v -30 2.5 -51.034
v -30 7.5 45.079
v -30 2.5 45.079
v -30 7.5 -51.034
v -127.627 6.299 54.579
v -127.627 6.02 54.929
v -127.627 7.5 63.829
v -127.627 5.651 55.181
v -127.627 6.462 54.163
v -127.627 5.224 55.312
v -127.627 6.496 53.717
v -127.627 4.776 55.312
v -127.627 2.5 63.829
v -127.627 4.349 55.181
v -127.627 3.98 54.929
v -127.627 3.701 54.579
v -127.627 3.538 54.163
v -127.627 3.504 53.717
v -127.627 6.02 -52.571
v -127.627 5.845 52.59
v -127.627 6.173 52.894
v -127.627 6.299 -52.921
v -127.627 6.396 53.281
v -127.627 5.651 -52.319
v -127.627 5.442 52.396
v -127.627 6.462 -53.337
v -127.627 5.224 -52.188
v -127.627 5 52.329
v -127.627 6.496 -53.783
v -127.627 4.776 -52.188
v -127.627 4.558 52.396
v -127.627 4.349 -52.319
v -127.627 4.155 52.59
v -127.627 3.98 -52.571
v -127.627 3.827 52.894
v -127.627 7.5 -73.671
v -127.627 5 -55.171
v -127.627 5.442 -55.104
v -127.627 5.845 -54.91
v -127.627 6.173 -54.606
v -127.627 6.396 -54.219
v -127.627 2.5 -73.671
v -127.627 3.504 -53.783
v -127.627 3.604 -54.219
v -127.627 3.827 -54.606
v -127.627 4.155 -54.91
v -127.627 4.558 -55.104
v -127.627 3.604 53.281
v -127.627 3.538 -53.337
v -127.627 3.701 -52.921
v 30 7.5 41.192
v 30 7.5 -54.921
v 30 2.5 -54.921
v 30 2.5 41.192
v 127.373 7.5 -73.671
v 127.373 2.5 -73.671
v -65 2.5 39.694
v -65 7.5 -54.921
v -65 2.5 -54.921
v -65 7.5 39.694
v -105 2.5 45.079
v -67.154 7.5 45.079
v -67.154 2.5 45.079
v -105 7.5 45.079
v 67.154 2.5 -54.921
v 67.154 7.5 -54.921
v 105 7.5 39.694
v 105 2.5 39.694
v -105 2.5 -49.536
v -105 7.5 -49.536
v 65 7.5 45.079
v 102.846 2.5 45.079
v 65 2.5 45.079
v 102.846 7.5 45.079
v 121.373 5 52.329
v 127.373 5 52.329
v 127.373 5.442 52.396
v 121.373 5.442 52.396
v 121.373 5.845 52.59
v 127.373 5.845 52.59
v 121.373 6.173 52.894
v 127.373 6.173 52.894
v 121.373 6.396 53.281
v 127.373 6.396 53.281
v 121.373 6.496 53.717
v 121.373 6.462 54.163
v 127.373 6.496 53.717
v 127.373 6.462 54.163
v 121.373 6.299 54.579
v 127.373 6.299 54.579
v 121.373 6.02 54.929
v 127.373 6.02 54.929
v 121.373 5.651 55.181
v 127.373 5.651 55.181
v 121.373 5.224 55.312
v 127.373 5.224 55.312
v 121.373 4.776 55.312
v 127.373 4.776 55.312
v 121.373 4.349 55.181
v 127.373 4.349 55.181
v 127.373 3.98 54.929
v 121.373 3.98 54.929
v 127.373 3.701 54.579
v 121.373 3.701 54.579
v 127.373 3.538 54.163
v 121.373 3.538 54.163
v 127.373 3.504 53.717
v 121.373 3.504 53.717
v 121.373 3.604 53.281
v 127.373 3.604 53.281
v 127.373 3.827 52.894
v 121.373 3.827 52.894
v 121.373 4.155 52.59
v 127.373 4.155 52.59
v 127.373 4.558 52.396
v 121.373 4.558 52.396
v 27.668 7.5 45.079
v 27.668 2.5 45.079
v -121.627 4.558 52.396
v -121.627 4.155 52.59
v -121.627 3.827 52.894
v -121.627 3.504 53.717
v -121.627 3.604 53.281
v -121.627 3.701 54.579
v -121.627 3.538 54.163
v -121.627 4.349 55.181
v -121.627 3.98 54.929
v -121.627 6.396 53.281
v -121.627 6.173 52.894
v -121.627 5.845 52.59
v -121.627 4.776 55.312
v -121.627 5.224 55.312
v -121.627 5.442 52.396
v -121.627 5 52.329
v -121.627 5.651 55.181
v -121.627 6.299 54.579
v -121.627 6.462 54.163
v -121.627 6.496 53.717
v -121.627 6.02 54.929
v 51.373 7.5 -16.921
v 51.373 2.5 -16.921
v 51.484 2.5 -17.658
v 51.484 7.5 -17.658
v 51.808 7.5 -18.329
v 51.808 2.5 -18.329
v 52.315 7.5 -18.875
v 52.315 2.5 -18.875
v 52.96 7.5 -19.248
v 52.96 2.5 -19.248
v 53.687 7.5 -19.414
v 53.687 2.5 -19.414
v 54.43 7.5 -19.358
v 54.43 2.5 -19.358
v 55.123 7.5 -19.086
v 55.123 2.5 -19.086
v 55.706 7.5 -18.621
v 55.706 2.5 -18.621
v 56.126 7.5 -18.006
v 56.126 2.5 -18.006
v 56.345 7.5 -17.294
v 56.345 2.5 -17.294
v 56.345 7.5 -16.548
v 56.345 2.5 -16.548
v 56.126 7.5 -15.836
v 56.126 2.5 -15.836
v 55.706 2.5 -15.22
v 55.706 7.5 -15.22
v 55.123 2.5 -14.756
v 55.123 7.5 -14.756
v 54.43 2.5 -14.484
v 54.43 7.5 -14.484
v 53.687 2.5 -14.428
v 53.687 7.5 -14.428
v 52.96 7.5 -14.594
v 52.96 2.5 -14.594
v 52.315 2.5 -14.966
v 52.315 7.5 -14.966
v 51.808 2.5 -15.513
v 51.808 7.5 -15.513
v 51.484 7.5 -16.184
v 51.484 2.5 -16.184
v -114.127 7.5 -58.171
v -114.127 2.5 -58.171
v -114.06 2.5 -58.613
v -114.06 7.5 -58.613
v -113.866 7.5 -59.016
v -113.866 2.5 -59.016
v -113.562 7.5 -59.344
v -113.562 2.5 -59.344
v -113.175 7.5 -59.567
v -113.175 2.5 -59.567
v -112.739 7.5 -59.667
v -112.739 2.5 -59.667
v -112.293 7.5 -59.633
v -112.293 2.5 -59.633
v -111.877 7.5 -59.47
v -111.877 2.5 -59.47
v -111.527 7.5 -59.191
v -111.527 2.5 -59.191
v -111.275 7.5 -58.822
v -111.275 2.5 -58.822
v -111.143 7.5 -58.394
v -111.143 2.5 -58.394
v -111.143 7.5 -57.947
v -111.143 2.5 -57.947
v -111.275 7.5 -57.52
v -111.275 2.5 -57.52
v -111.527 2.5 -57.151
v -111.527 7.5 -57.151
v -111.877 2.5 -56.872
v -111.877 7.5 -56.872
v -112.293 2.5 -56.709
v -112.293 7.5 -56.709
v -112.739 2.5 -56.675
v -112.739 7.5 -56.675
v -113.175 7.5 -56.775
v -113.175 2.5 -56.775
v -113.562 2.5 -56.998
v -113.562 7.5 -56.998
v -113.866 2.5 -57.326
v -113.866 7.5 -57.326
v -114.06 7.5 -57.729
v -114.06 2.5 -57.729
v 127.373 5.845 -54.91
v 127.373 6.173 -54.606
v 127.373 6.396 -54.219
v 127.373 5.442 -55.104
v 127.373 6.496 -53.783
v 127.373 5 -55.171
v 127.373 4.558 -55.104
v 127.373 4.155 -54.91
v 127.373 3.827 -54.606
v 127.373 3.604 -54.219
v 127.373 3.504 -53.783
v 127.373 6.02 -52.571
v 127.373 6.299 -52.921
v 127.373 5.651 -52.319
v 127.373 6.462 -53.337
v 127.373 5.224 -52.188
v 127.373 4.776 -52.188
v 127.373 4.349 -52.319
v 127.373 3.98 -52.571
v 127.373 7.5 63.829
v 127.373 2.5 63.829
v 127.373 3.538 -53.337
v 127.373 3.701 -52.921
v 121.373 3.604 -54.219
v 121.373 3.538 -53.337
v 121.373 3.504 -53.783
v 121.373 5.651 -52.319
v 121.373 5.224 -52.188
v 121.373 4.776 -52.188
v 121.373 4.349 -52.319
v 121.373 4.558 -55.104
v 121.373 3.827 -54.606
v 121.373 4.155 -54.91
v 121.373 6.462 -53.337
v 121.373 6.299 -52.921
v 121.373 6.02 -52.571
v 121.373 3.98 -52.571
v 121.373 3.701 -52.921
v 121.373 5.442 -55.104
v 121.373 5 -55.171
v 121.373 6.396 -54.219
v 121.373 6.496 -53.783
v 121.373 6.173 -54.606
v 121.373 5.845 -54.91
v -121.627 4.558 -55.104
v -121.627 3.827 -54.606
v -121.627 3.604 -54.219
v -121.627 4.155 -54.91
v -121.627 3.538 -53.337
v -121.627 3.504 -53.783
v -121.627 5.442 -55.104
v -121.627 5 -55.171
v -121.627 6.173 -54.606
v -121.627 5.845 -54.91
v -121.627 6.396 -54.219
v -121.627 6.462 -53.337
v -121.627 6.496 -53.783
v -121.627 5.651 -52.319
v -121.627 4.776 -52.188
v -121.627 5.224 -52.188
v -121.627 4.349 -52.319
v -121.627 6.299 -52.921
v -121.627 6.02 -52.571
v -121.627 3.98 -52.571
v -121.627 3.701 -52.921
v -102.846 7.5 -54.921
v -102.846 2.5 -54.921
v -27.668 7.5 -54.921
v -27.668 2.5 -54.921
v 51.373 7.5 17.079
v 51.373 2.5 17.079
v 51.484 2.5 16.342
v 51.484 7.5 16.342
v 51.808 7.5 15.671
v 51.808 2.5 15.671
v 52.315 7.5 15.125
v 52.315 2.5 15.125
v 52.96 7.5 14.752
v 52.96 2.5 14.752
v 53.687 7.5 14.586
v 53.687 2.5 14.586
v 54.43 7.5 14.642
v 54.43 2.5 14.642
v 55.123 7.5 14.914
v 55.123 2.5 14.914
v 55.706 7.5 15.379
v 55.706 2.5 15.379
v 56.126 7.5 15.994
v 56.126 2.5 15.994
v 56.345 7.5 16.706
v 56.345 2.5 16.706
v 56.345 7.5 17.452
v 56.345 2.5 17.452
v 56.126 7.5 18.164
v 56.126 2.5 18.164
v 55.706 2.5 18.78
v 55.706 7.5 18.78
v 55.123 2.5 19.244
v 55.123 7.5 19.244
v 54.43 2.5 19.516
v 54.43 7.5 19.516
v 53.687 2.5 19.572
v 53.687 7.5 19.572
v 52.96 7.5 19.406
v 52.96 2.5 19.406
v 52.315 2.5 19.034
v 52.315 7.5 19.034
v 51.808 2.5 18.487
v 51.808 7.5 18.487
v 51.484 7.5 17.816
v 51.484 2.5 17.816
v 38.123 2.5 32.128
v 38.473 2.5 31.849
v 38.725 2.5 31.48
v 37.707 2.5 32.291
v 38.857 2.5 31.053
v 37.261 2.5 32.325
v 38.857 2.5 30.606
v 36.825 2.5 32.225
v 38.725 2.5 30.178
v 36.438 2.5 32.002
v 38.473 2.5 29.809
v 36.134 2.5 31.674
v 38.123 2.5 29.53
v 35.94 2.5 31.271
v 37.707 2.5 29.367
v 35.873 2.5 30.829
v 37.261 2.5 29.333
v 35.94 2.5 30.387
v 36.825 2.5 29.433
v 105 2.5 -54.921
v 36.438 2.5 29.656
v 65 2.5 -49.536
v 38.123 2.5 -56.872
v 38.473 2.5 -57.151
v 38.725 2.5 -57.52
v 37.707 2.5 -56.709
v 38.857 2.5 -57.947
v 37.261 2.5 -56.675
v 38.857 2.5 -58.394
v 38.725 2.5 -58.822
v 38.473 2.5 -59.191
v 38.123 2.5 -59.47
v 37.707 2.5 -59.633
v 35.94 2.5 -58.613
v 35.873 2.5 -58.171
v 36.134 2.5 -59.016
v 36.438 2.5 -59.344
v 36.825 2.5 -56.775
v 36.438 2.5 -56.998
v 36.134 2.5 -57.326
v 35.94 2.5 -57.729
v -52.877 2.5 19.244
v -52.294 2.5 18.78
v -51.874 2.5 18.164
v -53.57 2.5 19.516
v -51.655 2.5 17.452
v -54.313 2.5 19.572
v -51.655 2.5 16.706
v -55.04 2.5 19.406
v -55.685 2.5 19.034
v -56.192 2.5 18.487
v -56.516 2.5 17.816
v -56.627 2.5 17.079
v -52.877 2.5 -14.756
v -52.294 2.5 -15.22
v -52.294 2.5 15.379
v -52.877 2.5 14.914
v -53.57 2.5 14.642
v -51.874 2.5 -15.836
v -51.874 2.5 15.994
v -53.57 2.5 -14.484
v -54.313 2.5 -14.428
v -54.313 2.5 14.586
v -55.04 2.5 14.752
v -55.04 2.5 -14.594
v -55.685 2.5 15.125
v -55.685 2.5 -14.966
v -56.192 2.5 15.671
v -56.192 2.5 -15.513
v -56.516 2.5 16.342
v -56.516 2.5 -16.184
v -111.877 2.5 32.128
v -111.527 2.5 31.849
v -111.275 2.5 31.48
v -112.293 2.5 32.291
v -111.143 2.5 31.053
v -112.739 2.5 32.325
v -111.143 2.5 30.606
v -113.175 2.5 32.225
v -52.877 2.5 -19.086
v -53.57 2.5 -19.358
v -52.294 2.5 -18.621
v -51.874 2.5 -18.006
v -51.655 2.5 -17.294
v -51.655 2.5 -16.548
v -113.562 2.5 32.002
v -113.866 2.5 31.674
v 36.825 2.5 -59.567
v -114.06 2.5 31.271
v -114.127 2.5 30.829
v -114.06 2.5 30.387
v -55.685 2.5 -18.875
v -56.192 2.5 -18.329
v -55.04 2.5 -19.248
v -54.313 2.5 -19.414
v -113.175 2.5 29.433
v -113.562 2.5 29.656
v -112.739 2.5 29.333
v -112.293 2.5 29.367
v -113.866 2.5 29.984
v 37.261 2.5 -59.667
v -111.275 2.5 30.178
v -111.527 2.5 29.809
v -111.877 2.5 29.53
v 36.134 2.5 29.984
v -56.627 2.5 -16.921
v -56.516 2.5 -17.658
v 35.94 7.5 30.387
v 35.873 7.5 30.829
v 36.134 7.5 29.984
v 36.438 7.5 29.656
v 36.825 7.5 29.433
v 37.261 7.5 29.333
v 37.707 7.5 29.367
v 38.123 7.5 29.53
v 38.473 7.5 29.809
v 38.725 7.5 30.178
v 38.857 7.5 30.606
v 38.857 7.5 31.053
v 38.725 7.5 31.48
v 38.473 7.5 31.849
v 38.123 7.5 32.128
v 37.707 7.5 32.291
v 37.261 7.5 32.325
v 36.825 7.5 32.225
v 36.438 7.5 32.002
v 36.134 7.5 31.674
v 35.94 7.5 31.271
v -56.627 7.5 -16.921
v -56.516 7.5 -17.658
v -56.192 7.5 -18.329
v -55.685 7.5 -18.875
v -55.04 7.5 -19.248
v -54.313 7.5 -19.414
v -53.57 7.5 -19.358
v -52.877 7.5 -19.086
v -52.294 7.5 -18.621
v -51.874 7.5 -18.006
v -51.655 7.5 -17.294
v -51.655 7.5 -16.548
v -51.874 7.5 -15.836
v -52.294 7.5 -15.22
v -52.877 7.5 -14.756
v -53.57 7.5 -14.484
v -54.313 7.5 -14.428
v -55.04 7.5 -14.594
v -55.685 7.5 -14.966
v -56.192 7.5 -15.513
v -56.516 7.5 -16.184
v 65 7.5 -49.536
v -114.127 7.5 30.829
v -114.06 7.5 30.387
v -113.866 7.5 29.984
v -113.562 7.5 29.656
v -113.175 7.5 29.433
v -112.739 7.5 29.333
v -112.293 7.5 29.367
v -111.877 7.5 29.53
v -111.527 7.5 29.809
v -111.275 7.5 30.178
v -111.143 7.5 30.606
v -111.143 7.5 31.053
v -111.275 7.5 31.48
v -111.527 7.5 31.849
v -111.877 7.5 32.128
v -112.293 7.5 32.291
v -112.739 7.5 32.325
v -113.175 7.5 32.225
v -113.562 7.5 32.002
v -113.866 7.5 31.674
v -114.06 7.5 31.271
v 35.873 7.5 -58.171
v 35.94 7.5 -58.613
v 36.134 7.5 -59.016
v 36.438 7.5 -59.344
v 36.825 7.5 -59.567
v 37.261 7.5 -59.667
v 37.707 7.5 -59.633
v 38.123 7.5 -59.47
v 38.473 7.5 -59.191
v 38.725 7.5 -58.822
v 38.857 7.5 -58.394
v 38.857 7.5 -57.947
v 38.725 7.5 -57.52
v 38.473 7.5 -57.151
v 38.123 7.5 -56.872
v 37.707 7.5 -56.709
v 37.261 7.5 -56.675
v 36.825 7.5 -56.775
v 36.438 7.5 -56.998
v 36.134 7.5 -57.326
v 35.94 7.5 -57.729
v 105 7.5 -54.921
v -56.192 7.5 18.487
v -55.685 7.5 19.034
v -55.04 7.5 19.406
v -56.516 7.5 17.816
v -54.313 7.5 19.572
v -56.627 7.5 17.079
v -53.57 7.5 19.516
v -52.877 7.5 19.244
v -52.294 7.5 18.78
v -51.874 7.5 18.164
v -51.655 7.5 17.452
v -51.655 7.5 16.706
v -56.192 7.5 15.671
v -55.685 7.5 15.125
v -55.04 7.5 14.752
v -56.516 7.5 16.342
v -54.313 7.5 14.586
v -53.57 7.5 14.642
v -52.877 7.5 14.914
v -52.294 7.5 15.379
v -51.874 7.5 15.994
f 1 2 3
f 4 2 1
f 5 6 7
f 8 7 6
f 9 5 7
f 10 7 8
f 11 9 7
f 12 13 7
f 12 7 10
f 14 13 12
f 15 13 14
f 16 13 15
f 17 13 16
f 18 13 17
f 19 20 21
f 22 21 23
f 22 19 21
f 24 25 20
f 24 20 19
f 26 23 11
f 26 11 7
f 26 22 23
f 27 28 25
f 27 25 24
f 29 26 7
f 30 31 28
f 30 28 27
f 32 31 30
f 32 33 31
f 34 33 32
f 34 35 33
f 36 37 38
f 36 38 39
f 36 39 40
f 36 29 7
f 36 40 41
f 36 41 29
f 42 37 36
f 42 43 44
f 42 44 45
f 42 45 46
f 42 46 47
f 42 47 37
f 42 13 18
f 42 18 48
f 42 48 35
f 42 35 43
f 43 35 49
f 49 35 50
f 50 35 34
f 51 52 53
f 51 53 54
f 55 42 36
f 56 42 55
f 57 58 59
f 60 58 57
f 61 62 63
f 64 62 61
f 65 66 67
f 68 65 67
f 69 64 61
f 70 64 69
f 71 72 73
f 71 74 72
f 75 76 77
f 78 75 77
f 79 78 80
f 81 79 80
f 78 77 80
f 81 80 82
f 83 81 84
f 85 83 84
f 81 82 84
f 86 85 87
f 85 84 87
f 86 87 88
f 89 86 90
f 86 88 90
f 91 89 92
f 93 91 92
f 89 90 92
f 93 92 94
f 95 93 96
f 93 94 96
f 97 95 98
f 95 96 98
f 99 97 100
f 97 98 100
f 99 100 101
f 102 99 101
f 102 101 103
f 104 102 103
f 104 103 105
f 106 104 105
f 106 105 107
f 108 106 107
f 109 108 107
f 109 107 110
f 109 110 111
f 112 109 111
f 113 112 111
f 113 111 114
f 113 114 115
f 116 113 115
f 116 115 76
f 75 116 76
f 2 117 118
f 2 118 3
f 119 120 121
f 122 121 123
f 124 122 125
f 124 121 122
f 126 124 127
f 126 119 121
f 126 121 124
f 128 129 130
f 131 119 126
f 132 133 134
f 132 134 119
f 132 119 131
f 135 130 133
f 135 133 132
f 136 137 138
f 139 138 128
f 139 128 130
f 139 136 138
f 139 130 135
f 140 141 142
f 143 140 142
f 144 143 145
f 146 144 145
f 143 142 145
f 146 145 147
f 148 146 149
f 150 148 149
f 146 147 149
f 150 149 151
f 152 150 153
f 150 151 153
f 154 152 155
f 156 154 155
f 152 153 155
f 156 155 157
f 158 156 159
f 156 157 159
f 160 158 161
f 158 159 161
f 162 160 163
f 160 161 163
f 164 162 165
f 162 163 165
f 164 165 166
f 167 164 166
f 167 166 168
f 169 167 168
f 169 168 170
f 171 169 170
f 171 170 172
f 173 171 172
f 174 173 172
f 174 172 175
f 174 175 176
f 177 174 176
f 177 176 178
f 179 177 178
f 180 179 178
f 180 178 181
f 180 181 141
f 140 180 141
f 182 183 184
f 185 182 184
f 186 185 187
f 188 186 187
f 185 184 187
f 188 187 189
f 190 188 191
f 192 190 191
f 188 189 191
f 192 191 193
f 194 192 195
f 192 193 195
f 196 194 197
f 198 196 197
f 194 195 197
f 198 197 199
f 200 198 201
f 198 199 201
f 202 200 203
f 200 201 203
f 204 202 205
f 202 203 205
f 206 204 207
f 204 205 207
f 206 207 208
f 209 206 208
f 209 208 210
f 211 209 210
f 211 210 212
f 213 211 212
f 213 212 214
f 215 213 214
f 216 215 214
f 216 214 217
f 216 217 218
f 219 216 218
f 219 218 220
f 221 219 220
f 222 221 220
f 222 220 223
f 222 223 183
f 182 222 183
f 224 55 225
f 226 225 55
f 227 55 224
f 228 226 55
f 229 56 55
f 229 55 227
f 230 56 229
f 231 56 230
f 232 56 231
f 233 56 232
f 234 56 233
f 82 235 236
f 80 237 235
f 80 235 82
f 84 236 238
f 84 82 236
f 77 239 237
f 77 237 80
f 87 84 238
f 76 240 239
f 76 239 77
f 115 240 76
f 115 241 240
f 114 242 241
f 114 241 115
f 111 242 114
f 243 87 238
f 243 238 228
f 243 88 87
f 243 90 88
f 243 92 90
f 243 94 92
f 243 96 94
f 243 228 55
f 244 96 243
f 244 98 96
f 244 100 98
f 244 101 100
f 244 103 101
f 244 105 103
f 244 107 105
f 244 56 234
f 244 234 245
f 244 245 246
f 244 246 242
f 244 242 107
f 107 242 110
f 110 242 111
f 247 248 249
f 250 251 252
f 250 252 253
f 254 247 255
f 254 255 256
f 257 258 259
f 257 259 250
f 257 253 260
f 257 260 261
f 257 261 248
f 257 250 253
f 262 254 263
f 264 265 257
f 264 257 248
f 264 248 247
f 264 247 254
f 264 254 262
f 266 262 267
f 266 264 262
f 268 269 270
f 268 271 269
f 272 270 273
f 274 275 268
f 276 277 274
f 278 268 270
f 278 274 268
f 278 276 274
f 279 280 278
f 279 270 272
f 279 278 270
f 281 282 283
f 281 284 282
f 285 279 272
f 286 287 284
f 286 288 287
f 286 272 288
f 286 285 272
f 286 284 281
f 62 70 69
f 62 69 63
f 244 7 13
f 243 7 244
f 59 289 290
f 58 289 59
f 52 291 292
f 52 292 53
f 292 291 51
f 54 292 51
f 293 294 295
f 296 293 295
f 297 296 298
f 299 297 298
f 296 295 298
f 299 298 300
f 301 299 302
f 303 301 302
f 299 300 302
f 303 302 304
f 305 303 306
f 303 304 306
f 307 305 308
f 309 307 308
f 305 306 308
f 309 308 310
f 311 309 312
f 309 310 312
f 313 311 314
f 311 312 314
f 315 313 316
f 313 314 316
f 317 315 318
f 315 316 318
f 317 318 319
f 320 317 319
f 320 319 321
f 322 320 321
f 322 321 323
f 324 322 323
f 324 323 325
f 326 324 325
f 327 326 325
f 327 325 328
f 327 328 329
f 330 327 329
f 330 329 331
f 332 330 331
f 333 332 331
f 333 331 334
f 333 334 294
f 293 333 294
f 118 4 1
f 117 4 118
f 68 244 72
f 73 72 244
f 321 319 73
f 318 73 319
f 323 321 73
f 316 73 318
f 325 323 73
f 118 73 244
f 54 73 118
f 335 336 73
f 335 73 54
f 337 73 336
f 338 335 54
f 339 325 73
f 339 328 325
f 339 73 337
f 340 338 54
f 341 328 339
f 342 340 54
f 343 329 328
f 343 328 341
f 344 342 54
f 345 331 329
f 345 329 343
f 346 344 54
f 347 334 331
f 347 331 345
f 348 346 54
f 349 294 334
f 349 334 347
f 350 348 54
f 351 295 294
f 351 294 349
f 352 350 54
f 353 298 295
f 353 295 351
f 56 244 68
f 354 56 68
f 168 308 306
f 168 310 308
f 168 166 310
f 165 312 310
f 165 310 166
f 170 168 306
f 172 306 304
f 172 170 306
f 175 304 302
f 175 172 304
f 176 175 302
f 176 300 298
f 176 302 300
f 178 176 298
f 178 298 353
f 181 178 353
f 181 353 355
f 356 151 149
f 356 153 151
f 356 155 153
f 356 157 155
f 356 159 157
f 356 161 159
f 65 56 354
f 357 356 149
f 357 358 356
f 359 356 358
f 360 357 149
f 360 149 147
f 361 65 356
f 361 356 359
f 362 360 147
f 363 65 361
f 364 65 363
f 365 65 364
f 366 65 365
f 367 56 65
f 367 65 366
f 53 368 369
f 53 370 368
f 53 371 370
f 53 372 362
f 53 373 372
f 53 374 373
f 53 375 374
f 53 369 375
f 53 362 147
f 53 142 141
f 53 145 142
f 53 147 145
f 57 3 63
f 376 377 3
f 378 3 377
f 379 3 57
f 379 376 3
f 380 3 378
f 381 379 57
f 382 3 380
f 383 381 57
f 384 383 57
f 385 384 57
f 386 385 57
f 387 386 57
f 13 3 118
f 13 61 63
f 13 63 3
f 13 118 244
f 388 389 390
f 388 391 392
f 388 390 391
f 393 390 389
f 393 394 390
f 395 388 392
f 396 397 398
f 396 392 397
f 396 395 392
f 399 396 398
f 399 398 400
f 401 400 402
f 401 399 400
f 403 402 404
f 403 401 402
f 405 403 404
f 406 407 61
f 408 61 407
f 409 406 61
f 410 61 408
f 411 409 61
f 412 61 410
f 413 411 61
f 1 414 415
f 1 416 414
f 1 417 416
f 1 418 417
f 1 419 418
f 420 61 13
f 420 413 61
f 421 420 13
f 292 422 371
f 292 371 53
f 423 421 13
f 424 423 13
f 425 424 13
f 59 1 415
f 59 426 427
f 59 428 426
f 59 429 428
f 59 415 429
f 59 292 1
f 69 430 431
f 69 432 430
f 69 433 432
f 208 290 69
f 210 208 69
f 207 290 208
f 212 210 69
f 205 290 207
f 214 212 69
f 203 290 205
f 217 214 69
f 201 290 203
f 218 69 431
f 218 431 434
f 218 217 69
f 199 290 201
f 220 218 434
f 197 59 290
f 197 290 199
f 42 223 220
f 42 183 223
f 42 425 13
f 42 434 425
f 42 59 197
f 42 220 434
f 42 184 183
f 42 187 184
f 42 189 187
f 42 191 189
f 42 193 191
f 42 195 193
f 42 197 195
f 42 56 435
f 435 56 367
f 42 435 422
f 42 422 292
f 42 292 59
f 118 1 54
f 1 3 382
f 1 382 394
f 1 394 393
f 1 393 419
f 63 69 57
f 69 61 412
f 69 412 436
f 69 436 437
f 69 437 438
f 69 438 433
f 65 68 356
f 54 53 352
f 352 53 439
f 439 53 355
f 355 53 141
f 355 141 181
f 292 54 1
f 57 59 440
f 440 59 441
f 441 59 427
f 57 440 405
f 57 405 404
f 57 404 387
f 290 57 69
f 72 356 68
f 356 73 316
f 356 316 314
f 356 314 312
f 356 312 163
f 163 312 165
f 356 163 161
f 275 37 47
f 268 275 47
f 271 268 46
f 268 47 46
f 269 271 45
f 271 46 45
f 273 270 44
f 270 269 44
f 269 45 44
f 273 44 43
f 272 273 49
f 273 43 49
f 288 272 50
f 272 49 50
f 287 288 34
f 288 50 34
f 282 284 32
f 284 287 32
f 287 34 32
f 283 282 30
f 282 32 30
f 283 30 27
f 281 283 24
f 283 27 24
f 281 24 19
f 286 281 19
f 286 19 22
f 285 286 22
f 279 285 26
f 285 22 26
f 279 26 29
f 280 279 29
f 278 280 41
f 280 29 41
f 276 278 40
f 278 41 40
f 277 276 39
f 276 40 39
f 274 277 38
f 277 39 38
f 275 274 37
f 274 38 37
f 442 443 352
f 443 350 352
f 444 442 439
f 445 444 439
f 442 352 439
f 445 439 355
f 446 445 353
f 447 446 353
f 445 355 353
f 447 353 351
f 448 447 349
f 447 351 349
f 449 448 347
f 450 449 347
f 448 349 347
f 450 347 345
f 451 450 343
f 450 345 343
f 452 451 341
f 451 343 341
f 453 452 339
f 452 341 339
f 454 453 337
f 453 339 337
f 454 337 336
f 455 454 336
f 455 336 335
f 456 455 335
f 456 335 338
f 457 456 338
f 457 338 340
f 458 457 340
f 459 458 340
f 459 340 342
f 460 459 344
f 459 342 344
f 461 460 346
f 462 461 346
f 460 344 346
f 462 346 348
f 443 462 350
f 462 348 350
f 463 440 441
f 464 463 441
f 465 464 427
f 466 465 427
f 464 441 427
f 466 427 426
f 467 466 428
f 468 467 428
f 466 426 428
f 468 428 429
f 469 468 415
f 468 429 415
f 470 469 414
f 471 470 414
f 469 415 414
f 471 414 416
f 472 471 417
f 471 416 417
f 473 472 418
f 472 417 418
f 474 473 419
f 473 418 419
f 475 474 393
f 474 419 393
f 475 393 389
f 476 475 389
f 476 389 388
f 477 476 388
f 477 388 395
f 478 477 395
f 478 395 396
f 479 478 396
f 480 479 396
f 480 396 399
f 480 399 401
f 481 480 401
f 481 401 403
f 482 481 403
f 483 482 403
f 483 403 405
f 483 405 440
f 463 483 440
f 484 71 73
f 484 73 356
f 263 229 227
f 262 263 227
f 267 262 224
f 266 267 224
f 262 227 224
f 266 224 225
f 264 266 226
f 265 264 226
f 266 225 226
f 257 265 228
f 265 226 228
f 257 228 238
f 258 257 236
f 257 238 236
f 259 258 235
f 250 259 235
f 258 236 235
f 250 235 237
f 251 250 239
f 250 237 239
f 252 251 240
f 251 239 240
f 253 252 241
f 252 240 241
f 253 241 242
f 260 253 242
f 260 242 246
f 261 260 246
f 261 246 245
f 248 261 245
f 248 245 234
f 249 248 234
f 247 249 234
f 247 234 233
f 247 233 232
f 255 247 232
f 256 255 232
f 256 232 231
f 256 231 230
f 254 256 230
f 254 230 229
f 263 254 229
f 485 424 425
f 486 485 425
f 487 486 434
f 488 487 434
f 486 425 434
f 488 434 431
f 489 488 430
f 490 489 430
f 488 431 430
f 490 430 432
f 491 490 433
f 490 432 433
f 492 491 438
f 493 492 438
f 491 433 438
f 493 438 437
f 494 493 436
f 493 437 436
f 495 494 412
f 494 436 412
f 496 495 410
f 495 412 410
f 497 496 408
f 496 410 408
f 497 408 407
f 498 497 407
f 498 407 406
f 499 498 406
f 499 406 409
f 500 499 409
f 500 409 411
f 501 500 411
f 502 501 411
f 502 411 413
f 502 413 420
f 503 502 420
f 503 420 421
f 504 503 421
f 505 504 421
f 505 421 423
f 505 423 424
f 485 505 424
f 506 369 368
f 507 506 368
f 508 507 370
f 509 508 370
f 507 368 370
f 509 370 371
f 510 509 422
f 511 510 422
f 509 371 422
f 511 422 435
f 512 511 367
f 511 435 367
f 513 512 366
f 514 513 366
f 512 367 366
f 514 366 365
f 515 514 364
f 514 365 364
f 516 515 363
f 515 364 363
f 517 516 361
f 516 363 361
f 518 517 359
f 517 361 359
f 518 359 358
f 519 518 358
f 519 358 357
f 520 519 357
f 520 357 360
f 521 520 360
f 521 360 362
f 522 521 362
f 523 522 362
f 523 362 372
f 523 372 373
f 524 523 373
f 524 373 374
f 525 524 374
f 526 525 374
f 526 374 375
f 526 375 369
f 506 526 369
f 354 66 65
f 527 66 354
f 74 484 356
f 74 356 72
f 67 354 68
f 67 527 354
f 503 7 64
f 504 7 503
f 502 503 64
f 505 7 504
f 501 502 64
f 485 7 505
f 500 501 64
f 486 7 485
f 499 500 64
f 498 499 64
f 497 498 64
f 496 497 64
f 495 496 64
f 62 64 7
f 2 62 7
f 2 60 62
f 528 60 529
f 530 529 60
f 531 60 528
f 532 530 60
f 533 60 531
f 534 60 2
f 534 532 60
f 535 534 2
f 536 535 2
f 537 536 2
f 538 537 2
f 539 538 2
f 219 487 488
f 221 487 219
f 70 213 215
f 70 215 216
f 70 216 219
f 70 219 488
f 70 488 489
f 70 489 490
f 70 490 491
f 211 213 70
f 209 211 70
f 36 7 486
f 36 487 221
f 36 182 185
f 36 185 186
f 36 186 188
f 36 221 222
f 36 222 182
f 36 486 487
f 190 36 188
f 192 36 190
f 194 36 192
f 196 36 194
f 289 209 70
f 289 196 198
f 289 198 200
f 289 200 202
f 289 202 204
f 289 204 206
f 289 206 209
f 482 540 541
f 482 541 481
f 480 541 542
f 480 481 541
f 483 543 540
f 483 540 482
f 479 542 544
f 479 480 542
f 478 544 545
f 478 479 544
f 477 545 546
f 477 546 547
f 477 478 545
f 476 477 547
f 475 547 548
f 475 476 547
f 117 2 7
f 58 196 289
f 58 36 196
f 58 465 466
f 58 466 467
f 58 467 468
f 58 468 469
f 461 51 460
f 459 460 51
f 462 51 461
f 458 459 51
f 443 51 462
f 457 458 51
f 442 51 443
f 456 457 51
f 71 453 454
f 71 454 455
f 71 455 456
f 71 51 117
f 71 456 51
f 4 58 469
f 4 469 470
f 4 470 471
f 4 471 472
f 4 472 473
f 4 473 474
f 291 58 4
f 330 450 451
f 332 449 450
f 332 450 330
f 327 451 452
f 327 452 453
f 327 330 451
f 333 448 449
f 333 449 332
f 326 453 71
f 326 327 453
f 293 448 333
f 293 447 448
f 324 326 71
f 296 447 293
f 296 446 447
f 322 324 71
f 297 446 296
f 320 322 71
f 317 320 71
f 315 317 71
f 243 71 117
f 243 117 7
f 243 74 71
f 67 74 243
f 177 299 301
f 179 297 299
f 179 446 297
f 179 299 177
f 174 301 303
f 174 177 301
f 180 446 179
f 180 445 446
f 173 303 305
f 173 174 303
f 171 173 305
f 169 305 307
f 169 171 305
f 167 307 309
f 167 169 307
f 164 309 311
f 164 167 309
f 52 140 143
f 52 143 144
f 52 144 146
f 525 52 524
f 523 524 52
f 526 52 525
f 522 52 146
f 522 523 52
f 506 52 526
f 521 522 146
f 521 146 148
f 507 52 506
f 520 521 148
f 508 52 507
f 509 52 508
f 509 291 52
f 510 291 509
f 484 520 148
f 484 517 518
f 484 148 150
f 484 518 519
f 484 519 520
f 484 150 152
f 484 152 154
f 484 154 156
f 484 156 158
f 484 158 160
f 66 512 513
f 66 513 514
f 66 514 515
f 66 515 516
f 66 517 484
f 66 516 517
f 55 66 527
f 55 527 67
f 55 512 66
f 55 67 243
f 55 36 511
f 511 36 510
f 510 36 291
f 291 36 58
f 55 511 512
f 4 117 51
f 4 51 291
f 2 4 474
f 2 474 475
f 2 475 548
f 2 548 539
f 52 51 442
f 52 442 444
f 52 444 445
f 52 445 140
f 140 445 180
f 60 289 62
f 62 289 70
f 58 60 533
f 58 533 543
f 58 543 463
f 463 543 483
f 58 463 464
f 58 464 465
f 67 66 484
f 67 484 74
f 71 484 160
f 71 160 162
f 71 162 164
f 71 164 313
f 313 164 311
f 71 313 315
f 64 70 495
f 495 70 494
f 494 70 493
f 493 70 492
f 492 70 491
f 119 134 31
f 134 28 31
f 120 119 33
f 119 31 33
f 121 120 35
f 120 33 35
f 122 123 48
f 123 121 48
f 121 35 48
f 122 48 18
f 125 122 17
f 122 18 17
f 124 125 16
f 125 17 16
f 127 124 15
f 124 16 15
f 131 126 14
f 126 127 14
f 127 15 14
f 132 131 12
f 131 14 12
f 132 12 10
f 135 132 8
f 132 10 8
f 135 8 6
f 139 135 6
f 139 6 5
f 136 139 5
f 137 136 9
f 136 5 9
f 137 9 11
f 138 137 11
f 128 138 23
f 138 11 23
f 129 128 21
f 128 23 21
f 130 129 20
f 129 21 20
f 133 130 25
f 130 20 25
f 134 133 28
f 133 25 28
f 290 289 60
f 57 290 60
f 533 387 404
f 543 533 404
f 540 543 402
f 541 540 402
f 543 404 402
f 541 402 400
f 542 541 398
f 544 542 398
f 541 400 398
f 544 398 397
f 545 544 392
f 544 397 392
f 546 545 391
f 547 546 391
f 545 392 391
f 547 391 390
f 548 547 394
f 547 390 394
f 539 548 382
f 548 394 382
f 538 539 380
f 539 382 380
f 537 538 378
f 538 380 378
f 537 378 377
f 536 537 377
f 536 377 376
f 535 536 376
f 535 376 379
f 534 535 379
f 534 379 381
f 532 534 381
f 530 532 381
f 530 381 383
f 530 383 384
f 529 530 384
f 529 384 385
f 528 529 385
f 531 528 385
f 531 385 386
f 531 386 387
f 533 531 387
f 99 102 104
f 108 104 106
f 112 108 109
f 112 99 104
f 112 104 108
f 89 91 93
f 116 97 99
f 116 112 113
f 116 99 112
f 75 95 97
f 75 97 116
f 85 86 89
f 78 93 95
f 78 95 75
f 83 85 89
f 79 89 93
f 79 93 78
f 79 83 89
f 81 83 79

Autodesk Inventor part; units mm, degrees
ref_plane "YZ Plane" through (0, 0, 0) normal (1, 0, 0) x (0, 1, 0)
ref_plane "XZ Plane" through (0, 0, 0) normal (0, 1, 0) x (-1, 0, 0)
ref_plane "XY Plane" through (0, 0, 0) normal (0, 0, 1) x (1, 0, 0)
sketch "Sketch1" plane through (0, 0, 0) normal (0, 1, 0) x (-1, 0, 0)
  circle A0 centre (-37.3734, -58.1709) radius 1.5
  circle A1 centre (112.6266, 30.8291) radius 1.5
  circle A2 centre (-37.3734, 30.8291) radius 1.5
  circle A3 centre (112.6266, -58.1709) radius 1.5
  circle A4 centre (54.1266, -16.9209) radius 2.5
  circle A5 centre (-53.8734, 17.0791) radius 2.5
  circle A6 centre (54.1266, 17.0791) radius 2.5
  circle A7 centre (-53.8734, -16.9209) radius 2.5
  line L0 (-127.3734, 73.8291) -> (127.6266, 73.8291)
  line L1 (-127.3734, -73.6709) -> (-127.3734, 73.8291)
  line L2 (127.6266, -73.6709) -> (-127.3734, -73.6709)
  line L3 (127.6266, 73.8291) -> (127.6266, -73.6709)
  point P0 (0, 0)
  point P1 (0.1266, 73.8291)
extrude "Extrusion1" add sketch "Sketch1" along normal blind 10
sketch "Sketch2" plane through (127.3734, 0, 73.8291) normal (1, 0, 0) x (0, 0, -1)
  line L0 (147.5, 0) -> (147.5, 10) projected
  line L1 (0, 0) -> (0, 10) projected
  circle A0 centre (127.5, 5) radius 1.5
  circle A1 centre (20, 5) radius 1.5
  point P0 (73.8291, 0)
  point P1 (0, 5)
  dimension "d2" = 20
  dimension "d3" = 20
  dimension "d4" = 3
  dimension "d5" = 3
extrude "Extrusion2" cut sketch "Sketch2" against normal blind 6
ref_plane "Work Plane1" through (-0.1266, 0, 73.8291) normal (1, 0, 0) x (0, 0, -1)
mirror "Mirror1" about plane through (-0.1266, 0, 73.8291) normal (1, 0, 0) of "Extrusion2"
sketch "Sketch3" plane through (-127.6266, 0, 73.8291) normal (0, 0, 1) x (1, 0, 0)
  line L0 (255, 10) -> (0, 10) projected
  line L1 (255, 0) -> (0, 0)
  line L2 (0, 0) -> (0, 10)
  line L3 (0, 10) -> (255, 10)
  line L4 (255, 10) -> (255, 0)
  point P0 (127.6266, 0)
extrude "Extrusion3" cut sketch "Sketch3" against normal blind 10
sketch "Sketch4" plane through (0, 10, 0) normal (0, 1, 0) x (1, 0, 0)
  line L0 (127.3734, -63.8291) -> (127.3734, 73.6709) projected
  line L1 (-127.6266, -63.8291) -> (127.3734, -63.8291)
  line L2 (127.3734, -63.8291) -> (127.3734, 73.6709)
  line L3 (127.3734, 73.6709) -> (-127.6266, 73.6709)
  line L4 (-127.6266, 73.6709) -> (-127.6266, -63.8291)
  point P0 (0, 0)
ref_plane "Work Plane2" through (0, 5, 0) normal (0, 1, 0) x (1, 0, 0)
extrude "Extrusion4" cut sketch "Sketch4" against normal blind 2.5
mirror "Mirror2" about plane through (0, 5, 0) normal (0, 1, 0) of "Extrusion4"
sketch "Sketch6" plane through (0, 7.5, 0) normal (0, 1, 0) x (1, 0, 0)
  circle A0 centre (37.3734, 58.1709) radius 1.5 projected
  circle A1 centre (-112.6266, -30.8291) radius 1.5 projected
  circle A2 centre (37.3734, -30.8291) radius 1.5 projected
  circle A3 centre (-112.6266, 58.1709) radius 1.5 projected
  circle A4 centre (-54.1266, 16.9209) radius 2.5 projected
  circle A5 centre (53.8734, -17.0791) radius 2.5 projected
  circle A6 centre (-54.1266, -17.0791) radius 2.5 projected
  circle A7 centre (53.8734, 16.9209) radius 2.5 projected
  line L0 (127.3734, 73.6709) -> (127.3734, -63.8291) projected
  line L1 (-127.6266, 73.6709) -> (127.3734, 73.6709) projected
  line L2 (-127.6266, -63.8291) -> (-127.6266, 73.6709) projected
  line L3 (127.3734, -63.8291) -> (-127.6266, -63.8291) projected
  line L4 (-30, 54.9209) -> (30, 54.9209)
  line L5 (30, 54.9209) -> (30, -45.0791)
  line L6 (30, -45.0791) -> (-30, -45.0791)
  line L7 (-30, -45.0791) -> (-30, 54.9209)
  line L8 (-105, 54.9209) -> (-65, 54.9209)
  line L9 (-65, 54.9209) -> (-65, -45.0791)
  line L10 (-65, -45.0791) -> (-105, -45.0791)
  line L11 (-105, -45.0791) -> (-105, 54.9209)
  line L12 (65, 54.9209) -> (105, 54.9209)
  line L13 (105, 54.9209) -> (105, -45.0791)
  line L14 (105, -45.0791) -> (65, -45.0791)
  line L15 (65, -45.0791) -> (65, 54.9209)
  line L16 (-65, 4.9209) -> (-30, 4.9209) construction
  line L17 (30, 4.9209) -> (65, 4.9209) construction
  line L18 (0, 0) -> (0, 54.9209) construction
  line L19 (0, 54.9209) -> (-0.1266, 73.6709) construction
  line L20 (0, -45.0791) -> (-0.1266, -63.8291) construction
  line L21 (-105, 54.9209) -> (-65, -45.0791) construction
  line L22 (-103.143, 55.6637) -> (-63.143, -44.3363)
  line L23 (-106.857, 54.1781) -> (-66.857, -45.8219)
  line L24 (-30, 54.9209) -> (30, -45.0791)
  line L25 (-31.715, 53.8919) -> (28.285, -46.1081)
  line L26 (-28.285, 55.9499) -> (31.715, -44.0501)
  line L27 (65, 54.9209) -> (105, -45.0791) construction
  line L28 (57.4212, 79.253) -> (105, -39.6939)
  line L29 (53.7073, 77.7675) -> (103.2874, -46.1827)
  point P0 (67.1541, 54.9209)
  point P1 (102.8459, -45.0791)
  point P2 (65, 49.5357)
  point P3 (-27.6676, 54.9209)
  point P4 (30, -41.1918)
  point P5 (27.6676, -45.0791)
  point P6 (-30, 51.0336)
  point P7 (-102.8459, 54.9209)
  point P8 (-65, -39.6939)
  point P9 (-67.1541, -45.0791)
  point P10 (-105, 49.5357)
  dimension "d12" = 60
  dimension "d13" = 100
  dimension "d14" = 40
  dimension "d15" = 35
  dimension "d16" = 2
  dimension "d17" = 2
  dimension "d18" = 2
  dimension "d19" = 2
  dimension "d20" = 2
  dimension "d21" = 2
extrude "Extrusion5" cut sketch "Sketch6" against normal through all contours L12 L13 L28 | L29 L14 L15 | L4 L5 L26 | L25 L6 L7 | L8 L9 L22 | L23 L10 L11
ref_plane "Work Plane3" through (0, 5, 0) normal (0, 1, 0) x (1, 0, 0)
equation "\"d17\" = d16"
equation "\"d18\" = d16"
equation "\"d19\" = d16"
equation "\"d20\" = d16"
equation "\"d21\" = d20"
properties part number "midplate_3DPrint"
